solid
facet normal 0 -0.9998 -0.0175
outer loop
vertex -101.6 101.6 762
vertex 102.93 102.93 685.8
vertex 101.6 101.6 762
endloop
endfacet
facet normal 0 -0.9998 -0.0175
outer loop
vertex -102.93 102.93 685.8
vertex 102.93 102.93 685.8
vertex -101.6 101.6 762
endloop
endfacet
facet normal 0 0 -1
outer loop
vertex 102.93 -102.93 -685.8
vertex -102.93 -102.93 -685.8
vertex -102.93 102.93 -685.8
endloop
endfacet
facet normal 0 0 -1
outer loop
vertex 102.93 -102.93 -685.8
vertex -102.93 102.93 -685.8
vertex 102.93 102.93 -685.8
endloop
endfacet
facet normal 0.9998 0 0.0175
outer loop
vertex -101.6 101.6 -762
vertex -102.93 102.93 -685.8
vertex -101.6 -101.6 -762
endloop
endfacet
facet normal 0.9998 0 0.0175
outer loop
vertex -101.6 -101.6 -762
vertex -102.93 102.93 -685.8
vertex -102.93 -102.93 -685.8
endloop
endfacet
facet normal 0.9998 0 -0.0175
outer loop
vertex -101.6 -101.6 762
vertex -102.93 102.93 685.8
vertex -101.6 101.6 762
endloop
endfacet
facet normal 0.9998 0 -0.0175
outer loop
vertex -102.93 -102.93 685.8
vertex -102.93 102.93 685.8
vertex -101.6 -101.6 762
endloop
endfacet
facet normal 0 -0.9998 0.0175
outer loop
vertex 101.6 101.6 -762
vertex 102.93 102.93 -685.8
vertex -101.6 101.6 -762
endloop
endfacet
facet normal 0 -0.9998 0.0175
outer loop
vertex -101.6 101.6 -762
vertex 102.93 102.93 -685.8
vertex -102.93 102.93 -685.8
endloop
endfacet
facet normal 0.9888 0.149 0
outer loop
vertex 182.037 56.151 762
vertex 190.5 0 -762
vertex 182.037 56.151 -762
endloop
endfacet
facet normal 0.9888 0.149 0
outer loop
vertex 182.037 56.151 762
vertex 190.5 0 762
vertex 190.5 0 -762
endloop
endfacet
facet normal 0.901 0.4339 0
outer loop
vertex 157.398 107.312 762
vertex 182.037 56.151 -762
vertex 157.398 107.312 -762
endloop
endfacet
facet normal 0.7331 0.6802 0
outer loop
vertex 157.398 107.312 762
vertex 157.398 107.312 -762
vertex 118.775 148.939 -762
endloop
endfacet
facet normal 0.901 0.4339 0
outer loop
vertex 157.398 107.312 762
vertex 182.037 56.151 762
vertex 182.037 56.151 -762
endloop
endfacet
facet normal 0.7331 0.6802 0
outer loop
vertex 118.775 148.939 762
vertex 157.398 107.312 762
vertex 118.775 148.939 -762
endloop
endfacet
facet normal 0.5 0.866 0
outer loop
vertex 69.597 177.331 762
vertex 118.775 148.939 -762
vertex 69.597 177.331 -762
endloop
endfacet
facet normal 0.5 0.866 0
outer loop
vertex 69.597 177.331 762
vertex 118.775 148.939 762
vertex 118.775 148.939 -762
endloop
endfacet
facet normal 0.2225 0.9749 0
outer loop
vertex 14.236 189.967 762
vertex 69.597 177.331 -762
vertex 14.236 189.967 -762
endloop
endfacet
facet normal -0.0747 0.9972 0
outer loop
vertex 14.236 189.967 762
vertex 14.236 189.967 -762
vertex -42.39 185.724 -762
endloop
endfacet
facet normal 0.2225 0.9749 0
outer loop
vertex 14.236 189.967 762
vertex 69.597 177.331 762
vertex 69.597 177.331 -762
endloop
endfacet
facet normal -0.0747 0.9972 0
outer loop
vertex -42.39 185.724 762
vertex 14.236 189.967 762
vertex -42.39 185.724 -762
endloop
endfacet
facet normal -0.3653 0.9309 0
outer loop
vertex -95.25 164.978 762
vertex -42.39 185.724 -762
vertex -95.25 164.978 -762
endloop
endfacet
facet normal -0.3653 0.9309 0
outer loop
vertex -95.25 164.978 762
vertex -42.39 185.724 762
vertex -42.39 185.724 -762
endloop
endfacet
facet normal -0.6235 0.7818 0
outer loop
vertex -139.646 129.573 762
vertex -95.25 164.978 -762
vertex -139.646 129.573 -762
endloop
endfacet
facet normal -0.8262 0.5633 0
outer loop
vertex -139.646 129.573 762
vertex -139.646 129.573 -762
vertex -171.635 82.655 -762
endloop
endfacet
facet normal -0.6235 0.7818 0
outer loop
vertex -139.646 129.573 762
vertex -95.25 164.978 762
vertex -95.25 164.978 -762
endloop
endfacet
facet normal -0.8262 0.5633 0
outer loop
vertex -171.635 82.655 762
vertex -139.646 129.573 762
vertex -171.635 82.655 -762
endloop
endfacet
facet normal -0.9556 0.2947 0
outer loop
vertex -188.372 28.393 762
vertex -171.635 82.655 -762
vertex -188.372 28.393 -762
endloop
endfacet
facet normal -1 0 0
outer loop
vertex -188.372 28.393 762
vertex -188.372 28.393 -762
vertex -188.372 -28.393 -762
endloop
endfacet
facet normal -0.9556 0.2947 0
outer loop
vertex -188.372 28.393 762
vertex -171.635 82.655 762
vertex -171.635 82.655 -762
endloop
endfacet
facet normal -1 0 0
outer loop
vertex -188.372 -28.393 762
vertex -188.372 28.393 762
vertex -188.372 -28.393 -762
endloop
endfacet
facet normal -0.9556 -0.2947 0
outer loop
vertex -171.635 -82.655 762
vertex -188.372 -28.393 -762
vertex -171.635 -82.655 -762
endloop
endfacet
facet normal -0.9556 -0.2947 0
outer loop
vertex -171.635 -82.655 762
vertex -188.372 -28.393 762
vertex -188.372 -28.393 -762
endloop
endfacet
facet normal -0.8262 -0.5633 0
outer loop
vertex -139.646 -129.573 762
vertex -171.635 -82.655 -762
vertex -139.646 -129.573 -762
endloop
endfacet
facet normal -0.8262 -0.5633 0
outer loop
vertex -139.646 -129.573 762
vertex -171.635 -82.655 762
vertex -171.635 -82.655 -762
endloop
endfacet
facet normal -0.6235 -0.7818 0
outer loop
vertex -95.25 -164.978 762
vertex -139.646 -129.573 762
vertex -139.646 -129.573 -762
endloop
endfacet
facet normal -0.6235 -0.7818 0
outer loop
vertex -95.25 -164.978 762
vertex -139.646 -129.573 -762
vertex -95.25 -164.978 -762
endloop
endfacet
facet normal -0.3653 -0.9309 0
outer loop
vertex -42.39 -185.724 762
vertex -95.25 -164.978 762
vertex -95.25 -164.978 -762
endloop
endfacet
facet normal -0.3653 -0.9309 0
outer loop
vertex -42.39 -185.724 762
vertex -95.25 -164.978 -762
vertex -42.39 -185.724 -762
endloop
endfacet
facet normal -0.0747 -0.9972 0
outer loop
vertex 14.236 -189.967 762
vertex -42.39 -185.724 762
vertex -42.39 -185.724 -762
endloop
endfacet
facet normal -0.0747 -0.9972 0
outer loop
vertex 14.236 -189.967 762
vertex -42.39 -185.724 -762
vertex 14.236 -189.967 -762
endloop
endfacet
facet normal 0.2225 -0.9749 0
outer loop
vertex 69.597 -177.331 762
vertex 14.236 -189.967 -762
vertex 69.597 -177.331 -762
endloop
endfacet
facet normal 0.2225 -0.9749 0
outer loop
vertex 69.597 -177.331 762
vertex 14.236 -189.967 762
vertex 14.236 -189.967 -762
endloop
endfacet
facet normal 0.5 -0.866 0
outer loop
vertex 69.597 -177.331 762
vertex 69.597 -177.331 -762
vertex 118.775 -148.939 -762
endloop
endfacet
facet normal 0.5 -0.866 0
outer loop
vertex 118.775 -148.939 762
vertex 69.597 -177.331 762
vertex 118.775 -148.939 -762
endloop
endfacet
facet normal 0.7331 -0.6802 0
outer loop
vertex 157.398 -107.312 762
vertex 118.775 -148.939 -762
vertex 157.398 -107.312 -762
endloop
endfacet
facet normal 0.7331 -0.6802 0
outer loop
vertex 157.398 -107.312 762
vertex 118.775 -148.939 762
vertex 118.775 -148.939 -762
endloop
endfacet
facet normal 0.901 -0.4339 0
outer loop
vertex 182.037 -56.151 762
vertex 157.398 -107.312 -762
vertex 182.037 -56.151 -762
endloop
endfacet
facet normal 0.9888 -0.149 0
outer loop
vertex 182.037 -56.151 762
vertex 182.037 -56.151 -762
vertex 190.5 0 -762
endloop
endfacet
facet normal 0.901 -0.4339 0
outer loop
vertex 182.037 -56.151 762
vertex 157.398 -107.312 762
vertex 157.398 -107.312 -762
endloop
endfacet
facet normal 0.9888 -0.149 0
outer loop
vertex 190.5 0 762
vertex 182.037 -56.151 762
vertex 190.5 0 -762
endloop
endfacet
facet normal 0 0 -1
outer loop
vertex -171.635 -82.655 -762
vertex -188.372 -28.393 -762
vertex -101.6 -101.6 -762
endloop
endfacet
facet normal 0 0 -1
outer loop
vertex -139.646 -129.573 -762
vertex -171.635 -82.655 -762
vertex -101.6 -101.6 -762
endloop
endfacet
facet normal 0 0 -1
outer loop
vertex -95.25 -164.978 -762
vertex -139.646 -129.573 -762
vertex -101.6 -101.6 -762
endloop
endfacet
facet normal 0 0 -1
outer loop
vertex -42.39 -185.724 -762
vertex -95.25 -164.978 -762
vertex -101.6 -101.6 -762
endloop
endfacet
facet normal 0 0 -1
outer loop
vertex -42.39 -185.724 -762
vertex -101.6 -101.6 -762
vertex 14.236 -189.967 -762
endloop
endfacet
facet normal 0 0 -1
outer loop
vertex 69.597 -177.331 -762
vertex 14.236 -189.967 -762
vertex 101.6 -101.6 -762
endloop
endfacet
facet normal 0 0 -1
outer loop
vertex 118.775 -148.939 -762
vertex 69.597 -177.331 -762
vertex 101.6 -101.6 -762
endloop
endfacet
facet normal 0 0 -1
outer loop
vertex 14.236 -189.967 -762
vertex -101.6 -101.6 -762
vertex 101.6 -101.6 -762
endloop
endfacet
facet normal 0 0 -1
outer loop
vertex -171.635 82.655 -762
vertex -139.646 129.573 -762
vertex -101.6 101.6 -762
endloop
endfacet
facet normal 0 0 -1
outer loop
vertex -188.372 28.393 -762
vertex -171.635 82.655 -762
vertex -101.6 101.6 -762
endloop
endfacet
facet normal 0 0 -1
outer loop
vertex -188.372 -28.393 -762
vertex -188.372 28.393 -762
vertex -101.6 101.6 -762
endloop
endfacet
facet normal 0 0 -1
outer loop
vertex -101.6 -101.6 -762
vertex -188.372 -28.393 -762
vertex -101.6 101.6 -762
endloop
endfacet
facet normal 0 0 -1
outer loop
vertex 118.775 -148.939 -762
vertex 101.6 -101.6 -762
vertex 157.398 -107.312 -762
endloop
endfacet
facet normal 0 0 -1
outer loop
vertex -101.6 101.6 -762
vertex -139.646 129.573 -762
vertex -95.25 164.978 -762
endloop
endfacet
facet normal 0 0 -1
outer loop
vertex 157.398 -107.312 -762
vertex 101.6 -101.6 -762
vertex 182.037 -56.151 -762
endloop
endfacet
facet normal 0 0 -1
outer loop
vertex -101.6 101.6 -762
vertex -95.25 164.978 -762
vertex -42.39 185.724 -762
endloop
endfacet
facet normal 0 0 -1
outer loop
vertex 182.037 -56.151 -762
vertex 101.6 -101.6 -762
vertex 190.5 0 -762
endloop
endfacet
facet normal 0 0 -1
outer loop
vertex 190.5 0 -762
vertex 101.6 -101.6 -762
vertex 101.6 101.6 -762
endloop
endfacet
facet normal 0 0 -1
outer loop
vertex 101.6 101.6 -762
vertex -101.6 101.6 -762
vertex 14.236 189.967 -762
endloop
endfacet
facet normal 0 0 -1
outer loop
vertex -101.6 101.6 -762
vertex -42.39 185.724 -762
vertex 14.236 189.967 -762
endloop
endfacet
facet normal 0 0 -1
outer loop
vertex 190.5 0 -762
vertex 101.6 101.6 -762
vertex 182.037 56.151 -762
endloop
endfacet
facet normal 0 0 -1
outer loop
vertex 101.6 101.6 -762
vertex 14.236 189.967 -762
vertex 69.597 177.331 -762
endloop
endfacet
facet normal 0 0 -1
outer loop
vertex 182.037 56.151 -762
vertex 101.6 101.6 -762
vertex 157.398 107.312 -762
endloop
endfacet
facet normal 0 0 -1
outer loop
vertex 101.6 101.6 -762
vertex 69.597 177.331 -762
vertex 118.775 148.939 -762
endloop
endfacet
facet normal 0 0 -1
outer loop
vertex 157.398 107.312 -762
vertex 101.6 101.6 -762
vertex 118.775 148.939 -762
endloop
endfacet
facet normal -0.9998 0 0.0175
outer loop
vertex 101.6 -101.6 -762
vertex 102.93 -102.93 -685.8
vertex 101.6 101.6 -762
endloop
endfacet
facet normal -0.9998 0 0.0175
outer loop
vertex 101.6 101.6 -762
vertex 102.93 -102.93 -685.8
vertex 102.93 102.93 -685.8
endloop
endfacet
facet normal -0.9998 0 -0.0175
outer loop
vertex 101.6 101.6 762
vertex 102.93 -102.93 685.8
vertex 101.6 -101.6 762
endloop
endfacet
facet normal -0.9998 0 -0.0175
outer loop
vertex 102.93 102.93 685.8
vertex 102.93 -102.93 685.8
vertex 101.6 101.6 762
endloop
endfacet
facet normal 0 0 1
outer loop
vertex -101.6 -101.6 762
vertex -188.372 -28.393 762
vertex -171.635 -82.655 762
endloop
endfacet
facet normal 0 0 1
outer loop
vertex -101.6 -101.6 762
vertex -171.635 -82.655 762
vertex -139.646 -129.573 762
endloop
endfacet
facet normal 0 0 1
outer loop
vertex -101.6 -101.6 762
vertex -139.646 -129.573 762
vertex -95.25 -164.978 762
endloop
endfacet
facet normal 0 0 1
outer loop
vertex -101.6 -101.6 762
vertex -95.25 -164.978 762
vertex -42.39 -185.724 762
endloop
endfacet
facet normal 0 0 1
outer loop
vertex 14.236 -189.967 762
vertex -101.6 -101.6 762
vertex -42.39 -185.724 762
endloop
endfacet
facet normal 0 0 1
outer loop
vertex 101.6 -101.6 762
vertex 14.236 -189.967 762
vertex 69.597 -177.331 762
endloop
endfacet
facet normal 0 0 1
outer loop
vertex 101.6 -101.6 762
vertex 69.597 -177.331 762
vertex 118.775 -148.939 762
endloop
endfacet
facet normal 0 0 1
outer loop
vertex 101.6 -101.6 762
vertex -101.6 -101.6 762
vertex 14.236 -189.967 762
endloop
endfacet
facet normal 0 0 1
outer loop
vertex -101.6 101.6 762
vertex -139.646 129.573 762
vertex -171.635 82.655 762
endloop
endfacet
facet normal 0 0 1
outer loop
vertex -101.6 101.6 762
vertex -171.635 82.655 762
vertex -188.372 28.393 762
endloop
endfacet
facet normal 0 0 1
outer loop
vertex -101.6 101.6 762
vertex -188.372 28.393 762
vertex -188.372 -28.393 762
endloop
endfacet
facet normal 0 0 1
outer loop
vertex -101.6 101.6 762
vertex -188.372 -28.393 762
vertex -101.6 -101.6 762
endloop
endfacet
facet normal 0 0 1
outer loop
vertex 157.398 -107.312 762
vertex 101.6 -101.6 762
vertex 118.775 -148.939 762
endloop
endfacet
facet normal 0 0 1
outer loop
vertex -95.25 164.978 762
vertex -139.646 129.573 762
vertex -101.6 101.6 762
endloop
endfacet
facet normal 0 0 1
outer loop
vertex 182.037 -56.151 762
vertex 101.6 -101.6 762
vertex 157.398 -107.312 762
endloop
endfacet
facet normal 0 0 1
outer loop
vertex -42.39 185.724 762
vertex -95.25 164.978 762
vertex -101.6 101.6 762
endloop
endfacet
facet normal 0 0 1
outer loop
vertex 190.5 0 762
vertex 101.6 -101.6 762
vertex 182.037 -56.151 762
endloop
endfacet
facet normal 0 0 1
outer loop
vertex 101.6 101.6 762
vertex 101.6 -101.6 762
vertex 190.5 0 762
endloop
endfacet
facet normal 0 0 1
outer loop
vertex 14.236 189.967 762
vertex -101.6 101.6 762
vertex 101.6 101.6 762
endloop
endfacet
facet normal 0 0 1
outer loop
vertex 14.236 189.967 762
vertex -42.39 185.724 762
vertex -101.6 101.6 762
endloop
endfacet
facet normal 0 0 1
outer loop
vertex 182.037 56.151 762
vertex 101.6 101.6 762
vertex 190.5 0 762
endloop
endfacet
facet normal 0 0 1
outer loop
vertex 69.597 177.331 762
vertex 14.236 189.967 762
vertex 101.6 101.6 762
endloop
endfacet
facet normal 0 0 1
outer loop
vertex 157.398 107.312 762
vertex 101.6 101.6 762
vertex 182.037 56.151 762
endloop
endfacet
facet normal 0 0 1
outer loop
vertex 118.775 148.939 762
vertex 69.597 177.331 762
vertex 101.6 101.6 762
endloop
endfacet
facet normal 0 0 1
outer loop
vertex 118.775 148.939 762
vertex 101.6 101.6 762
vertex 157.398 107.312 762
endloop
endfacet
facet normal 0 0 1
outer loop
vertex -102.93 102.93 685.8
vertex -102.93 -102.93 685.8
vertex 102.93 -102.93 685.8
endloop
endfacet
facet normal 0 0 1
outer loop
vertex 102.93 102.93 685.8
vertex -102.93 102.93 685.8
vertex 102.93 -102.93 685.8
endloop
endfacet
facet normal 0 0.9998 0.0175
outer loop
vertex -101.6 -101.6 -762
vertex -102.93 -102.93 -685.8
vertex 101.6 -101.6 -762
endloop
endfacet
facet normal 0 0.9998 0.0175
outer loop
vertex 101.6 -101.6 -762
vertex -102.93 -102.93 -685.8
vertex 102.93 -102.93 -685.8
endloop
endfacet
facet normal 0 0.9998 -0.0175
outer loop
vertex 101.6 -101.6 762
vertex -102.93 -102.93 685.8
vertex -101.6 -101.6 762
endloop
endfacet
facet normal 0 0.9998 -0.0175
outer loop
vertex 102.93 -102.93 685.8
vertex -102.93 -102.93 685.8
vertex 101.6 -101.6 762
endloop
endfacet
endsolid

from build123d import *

# Parameters (mm, degrees)
F0_R     = 190.5
F1_DEPTH = 762
F2_W     = 203.2
F2_H     = 203.2
F3_DEPTH = 76.2
F3_TAPER = -1


with BuildPart() as f1:
    # F0 (on Top) → F1 (new body)
    with BuildSketch(Plane.XY):
        Circle(F0_R)
    extrude(amount=F1_DEPTH)

    # F2 (on face) → F3 (cut)
    with BuildSketch(Plane.XY.offset(762)):
        Rectangle(F2_W, F2_H)
    extrude(amount=-F3_DEPTH, taper=F3_TAPER, mode=Mode.SUBTRACT)

    # F4: F1 across face


with BuildPart() as f1_1:
    add(f1.part)
    add(f1.part.mirror(Plane(origin=(0, 0, 0), x_dir=(1, 0, 0), z_dir=(0, 0, -1))))


solid = f1_1.part
